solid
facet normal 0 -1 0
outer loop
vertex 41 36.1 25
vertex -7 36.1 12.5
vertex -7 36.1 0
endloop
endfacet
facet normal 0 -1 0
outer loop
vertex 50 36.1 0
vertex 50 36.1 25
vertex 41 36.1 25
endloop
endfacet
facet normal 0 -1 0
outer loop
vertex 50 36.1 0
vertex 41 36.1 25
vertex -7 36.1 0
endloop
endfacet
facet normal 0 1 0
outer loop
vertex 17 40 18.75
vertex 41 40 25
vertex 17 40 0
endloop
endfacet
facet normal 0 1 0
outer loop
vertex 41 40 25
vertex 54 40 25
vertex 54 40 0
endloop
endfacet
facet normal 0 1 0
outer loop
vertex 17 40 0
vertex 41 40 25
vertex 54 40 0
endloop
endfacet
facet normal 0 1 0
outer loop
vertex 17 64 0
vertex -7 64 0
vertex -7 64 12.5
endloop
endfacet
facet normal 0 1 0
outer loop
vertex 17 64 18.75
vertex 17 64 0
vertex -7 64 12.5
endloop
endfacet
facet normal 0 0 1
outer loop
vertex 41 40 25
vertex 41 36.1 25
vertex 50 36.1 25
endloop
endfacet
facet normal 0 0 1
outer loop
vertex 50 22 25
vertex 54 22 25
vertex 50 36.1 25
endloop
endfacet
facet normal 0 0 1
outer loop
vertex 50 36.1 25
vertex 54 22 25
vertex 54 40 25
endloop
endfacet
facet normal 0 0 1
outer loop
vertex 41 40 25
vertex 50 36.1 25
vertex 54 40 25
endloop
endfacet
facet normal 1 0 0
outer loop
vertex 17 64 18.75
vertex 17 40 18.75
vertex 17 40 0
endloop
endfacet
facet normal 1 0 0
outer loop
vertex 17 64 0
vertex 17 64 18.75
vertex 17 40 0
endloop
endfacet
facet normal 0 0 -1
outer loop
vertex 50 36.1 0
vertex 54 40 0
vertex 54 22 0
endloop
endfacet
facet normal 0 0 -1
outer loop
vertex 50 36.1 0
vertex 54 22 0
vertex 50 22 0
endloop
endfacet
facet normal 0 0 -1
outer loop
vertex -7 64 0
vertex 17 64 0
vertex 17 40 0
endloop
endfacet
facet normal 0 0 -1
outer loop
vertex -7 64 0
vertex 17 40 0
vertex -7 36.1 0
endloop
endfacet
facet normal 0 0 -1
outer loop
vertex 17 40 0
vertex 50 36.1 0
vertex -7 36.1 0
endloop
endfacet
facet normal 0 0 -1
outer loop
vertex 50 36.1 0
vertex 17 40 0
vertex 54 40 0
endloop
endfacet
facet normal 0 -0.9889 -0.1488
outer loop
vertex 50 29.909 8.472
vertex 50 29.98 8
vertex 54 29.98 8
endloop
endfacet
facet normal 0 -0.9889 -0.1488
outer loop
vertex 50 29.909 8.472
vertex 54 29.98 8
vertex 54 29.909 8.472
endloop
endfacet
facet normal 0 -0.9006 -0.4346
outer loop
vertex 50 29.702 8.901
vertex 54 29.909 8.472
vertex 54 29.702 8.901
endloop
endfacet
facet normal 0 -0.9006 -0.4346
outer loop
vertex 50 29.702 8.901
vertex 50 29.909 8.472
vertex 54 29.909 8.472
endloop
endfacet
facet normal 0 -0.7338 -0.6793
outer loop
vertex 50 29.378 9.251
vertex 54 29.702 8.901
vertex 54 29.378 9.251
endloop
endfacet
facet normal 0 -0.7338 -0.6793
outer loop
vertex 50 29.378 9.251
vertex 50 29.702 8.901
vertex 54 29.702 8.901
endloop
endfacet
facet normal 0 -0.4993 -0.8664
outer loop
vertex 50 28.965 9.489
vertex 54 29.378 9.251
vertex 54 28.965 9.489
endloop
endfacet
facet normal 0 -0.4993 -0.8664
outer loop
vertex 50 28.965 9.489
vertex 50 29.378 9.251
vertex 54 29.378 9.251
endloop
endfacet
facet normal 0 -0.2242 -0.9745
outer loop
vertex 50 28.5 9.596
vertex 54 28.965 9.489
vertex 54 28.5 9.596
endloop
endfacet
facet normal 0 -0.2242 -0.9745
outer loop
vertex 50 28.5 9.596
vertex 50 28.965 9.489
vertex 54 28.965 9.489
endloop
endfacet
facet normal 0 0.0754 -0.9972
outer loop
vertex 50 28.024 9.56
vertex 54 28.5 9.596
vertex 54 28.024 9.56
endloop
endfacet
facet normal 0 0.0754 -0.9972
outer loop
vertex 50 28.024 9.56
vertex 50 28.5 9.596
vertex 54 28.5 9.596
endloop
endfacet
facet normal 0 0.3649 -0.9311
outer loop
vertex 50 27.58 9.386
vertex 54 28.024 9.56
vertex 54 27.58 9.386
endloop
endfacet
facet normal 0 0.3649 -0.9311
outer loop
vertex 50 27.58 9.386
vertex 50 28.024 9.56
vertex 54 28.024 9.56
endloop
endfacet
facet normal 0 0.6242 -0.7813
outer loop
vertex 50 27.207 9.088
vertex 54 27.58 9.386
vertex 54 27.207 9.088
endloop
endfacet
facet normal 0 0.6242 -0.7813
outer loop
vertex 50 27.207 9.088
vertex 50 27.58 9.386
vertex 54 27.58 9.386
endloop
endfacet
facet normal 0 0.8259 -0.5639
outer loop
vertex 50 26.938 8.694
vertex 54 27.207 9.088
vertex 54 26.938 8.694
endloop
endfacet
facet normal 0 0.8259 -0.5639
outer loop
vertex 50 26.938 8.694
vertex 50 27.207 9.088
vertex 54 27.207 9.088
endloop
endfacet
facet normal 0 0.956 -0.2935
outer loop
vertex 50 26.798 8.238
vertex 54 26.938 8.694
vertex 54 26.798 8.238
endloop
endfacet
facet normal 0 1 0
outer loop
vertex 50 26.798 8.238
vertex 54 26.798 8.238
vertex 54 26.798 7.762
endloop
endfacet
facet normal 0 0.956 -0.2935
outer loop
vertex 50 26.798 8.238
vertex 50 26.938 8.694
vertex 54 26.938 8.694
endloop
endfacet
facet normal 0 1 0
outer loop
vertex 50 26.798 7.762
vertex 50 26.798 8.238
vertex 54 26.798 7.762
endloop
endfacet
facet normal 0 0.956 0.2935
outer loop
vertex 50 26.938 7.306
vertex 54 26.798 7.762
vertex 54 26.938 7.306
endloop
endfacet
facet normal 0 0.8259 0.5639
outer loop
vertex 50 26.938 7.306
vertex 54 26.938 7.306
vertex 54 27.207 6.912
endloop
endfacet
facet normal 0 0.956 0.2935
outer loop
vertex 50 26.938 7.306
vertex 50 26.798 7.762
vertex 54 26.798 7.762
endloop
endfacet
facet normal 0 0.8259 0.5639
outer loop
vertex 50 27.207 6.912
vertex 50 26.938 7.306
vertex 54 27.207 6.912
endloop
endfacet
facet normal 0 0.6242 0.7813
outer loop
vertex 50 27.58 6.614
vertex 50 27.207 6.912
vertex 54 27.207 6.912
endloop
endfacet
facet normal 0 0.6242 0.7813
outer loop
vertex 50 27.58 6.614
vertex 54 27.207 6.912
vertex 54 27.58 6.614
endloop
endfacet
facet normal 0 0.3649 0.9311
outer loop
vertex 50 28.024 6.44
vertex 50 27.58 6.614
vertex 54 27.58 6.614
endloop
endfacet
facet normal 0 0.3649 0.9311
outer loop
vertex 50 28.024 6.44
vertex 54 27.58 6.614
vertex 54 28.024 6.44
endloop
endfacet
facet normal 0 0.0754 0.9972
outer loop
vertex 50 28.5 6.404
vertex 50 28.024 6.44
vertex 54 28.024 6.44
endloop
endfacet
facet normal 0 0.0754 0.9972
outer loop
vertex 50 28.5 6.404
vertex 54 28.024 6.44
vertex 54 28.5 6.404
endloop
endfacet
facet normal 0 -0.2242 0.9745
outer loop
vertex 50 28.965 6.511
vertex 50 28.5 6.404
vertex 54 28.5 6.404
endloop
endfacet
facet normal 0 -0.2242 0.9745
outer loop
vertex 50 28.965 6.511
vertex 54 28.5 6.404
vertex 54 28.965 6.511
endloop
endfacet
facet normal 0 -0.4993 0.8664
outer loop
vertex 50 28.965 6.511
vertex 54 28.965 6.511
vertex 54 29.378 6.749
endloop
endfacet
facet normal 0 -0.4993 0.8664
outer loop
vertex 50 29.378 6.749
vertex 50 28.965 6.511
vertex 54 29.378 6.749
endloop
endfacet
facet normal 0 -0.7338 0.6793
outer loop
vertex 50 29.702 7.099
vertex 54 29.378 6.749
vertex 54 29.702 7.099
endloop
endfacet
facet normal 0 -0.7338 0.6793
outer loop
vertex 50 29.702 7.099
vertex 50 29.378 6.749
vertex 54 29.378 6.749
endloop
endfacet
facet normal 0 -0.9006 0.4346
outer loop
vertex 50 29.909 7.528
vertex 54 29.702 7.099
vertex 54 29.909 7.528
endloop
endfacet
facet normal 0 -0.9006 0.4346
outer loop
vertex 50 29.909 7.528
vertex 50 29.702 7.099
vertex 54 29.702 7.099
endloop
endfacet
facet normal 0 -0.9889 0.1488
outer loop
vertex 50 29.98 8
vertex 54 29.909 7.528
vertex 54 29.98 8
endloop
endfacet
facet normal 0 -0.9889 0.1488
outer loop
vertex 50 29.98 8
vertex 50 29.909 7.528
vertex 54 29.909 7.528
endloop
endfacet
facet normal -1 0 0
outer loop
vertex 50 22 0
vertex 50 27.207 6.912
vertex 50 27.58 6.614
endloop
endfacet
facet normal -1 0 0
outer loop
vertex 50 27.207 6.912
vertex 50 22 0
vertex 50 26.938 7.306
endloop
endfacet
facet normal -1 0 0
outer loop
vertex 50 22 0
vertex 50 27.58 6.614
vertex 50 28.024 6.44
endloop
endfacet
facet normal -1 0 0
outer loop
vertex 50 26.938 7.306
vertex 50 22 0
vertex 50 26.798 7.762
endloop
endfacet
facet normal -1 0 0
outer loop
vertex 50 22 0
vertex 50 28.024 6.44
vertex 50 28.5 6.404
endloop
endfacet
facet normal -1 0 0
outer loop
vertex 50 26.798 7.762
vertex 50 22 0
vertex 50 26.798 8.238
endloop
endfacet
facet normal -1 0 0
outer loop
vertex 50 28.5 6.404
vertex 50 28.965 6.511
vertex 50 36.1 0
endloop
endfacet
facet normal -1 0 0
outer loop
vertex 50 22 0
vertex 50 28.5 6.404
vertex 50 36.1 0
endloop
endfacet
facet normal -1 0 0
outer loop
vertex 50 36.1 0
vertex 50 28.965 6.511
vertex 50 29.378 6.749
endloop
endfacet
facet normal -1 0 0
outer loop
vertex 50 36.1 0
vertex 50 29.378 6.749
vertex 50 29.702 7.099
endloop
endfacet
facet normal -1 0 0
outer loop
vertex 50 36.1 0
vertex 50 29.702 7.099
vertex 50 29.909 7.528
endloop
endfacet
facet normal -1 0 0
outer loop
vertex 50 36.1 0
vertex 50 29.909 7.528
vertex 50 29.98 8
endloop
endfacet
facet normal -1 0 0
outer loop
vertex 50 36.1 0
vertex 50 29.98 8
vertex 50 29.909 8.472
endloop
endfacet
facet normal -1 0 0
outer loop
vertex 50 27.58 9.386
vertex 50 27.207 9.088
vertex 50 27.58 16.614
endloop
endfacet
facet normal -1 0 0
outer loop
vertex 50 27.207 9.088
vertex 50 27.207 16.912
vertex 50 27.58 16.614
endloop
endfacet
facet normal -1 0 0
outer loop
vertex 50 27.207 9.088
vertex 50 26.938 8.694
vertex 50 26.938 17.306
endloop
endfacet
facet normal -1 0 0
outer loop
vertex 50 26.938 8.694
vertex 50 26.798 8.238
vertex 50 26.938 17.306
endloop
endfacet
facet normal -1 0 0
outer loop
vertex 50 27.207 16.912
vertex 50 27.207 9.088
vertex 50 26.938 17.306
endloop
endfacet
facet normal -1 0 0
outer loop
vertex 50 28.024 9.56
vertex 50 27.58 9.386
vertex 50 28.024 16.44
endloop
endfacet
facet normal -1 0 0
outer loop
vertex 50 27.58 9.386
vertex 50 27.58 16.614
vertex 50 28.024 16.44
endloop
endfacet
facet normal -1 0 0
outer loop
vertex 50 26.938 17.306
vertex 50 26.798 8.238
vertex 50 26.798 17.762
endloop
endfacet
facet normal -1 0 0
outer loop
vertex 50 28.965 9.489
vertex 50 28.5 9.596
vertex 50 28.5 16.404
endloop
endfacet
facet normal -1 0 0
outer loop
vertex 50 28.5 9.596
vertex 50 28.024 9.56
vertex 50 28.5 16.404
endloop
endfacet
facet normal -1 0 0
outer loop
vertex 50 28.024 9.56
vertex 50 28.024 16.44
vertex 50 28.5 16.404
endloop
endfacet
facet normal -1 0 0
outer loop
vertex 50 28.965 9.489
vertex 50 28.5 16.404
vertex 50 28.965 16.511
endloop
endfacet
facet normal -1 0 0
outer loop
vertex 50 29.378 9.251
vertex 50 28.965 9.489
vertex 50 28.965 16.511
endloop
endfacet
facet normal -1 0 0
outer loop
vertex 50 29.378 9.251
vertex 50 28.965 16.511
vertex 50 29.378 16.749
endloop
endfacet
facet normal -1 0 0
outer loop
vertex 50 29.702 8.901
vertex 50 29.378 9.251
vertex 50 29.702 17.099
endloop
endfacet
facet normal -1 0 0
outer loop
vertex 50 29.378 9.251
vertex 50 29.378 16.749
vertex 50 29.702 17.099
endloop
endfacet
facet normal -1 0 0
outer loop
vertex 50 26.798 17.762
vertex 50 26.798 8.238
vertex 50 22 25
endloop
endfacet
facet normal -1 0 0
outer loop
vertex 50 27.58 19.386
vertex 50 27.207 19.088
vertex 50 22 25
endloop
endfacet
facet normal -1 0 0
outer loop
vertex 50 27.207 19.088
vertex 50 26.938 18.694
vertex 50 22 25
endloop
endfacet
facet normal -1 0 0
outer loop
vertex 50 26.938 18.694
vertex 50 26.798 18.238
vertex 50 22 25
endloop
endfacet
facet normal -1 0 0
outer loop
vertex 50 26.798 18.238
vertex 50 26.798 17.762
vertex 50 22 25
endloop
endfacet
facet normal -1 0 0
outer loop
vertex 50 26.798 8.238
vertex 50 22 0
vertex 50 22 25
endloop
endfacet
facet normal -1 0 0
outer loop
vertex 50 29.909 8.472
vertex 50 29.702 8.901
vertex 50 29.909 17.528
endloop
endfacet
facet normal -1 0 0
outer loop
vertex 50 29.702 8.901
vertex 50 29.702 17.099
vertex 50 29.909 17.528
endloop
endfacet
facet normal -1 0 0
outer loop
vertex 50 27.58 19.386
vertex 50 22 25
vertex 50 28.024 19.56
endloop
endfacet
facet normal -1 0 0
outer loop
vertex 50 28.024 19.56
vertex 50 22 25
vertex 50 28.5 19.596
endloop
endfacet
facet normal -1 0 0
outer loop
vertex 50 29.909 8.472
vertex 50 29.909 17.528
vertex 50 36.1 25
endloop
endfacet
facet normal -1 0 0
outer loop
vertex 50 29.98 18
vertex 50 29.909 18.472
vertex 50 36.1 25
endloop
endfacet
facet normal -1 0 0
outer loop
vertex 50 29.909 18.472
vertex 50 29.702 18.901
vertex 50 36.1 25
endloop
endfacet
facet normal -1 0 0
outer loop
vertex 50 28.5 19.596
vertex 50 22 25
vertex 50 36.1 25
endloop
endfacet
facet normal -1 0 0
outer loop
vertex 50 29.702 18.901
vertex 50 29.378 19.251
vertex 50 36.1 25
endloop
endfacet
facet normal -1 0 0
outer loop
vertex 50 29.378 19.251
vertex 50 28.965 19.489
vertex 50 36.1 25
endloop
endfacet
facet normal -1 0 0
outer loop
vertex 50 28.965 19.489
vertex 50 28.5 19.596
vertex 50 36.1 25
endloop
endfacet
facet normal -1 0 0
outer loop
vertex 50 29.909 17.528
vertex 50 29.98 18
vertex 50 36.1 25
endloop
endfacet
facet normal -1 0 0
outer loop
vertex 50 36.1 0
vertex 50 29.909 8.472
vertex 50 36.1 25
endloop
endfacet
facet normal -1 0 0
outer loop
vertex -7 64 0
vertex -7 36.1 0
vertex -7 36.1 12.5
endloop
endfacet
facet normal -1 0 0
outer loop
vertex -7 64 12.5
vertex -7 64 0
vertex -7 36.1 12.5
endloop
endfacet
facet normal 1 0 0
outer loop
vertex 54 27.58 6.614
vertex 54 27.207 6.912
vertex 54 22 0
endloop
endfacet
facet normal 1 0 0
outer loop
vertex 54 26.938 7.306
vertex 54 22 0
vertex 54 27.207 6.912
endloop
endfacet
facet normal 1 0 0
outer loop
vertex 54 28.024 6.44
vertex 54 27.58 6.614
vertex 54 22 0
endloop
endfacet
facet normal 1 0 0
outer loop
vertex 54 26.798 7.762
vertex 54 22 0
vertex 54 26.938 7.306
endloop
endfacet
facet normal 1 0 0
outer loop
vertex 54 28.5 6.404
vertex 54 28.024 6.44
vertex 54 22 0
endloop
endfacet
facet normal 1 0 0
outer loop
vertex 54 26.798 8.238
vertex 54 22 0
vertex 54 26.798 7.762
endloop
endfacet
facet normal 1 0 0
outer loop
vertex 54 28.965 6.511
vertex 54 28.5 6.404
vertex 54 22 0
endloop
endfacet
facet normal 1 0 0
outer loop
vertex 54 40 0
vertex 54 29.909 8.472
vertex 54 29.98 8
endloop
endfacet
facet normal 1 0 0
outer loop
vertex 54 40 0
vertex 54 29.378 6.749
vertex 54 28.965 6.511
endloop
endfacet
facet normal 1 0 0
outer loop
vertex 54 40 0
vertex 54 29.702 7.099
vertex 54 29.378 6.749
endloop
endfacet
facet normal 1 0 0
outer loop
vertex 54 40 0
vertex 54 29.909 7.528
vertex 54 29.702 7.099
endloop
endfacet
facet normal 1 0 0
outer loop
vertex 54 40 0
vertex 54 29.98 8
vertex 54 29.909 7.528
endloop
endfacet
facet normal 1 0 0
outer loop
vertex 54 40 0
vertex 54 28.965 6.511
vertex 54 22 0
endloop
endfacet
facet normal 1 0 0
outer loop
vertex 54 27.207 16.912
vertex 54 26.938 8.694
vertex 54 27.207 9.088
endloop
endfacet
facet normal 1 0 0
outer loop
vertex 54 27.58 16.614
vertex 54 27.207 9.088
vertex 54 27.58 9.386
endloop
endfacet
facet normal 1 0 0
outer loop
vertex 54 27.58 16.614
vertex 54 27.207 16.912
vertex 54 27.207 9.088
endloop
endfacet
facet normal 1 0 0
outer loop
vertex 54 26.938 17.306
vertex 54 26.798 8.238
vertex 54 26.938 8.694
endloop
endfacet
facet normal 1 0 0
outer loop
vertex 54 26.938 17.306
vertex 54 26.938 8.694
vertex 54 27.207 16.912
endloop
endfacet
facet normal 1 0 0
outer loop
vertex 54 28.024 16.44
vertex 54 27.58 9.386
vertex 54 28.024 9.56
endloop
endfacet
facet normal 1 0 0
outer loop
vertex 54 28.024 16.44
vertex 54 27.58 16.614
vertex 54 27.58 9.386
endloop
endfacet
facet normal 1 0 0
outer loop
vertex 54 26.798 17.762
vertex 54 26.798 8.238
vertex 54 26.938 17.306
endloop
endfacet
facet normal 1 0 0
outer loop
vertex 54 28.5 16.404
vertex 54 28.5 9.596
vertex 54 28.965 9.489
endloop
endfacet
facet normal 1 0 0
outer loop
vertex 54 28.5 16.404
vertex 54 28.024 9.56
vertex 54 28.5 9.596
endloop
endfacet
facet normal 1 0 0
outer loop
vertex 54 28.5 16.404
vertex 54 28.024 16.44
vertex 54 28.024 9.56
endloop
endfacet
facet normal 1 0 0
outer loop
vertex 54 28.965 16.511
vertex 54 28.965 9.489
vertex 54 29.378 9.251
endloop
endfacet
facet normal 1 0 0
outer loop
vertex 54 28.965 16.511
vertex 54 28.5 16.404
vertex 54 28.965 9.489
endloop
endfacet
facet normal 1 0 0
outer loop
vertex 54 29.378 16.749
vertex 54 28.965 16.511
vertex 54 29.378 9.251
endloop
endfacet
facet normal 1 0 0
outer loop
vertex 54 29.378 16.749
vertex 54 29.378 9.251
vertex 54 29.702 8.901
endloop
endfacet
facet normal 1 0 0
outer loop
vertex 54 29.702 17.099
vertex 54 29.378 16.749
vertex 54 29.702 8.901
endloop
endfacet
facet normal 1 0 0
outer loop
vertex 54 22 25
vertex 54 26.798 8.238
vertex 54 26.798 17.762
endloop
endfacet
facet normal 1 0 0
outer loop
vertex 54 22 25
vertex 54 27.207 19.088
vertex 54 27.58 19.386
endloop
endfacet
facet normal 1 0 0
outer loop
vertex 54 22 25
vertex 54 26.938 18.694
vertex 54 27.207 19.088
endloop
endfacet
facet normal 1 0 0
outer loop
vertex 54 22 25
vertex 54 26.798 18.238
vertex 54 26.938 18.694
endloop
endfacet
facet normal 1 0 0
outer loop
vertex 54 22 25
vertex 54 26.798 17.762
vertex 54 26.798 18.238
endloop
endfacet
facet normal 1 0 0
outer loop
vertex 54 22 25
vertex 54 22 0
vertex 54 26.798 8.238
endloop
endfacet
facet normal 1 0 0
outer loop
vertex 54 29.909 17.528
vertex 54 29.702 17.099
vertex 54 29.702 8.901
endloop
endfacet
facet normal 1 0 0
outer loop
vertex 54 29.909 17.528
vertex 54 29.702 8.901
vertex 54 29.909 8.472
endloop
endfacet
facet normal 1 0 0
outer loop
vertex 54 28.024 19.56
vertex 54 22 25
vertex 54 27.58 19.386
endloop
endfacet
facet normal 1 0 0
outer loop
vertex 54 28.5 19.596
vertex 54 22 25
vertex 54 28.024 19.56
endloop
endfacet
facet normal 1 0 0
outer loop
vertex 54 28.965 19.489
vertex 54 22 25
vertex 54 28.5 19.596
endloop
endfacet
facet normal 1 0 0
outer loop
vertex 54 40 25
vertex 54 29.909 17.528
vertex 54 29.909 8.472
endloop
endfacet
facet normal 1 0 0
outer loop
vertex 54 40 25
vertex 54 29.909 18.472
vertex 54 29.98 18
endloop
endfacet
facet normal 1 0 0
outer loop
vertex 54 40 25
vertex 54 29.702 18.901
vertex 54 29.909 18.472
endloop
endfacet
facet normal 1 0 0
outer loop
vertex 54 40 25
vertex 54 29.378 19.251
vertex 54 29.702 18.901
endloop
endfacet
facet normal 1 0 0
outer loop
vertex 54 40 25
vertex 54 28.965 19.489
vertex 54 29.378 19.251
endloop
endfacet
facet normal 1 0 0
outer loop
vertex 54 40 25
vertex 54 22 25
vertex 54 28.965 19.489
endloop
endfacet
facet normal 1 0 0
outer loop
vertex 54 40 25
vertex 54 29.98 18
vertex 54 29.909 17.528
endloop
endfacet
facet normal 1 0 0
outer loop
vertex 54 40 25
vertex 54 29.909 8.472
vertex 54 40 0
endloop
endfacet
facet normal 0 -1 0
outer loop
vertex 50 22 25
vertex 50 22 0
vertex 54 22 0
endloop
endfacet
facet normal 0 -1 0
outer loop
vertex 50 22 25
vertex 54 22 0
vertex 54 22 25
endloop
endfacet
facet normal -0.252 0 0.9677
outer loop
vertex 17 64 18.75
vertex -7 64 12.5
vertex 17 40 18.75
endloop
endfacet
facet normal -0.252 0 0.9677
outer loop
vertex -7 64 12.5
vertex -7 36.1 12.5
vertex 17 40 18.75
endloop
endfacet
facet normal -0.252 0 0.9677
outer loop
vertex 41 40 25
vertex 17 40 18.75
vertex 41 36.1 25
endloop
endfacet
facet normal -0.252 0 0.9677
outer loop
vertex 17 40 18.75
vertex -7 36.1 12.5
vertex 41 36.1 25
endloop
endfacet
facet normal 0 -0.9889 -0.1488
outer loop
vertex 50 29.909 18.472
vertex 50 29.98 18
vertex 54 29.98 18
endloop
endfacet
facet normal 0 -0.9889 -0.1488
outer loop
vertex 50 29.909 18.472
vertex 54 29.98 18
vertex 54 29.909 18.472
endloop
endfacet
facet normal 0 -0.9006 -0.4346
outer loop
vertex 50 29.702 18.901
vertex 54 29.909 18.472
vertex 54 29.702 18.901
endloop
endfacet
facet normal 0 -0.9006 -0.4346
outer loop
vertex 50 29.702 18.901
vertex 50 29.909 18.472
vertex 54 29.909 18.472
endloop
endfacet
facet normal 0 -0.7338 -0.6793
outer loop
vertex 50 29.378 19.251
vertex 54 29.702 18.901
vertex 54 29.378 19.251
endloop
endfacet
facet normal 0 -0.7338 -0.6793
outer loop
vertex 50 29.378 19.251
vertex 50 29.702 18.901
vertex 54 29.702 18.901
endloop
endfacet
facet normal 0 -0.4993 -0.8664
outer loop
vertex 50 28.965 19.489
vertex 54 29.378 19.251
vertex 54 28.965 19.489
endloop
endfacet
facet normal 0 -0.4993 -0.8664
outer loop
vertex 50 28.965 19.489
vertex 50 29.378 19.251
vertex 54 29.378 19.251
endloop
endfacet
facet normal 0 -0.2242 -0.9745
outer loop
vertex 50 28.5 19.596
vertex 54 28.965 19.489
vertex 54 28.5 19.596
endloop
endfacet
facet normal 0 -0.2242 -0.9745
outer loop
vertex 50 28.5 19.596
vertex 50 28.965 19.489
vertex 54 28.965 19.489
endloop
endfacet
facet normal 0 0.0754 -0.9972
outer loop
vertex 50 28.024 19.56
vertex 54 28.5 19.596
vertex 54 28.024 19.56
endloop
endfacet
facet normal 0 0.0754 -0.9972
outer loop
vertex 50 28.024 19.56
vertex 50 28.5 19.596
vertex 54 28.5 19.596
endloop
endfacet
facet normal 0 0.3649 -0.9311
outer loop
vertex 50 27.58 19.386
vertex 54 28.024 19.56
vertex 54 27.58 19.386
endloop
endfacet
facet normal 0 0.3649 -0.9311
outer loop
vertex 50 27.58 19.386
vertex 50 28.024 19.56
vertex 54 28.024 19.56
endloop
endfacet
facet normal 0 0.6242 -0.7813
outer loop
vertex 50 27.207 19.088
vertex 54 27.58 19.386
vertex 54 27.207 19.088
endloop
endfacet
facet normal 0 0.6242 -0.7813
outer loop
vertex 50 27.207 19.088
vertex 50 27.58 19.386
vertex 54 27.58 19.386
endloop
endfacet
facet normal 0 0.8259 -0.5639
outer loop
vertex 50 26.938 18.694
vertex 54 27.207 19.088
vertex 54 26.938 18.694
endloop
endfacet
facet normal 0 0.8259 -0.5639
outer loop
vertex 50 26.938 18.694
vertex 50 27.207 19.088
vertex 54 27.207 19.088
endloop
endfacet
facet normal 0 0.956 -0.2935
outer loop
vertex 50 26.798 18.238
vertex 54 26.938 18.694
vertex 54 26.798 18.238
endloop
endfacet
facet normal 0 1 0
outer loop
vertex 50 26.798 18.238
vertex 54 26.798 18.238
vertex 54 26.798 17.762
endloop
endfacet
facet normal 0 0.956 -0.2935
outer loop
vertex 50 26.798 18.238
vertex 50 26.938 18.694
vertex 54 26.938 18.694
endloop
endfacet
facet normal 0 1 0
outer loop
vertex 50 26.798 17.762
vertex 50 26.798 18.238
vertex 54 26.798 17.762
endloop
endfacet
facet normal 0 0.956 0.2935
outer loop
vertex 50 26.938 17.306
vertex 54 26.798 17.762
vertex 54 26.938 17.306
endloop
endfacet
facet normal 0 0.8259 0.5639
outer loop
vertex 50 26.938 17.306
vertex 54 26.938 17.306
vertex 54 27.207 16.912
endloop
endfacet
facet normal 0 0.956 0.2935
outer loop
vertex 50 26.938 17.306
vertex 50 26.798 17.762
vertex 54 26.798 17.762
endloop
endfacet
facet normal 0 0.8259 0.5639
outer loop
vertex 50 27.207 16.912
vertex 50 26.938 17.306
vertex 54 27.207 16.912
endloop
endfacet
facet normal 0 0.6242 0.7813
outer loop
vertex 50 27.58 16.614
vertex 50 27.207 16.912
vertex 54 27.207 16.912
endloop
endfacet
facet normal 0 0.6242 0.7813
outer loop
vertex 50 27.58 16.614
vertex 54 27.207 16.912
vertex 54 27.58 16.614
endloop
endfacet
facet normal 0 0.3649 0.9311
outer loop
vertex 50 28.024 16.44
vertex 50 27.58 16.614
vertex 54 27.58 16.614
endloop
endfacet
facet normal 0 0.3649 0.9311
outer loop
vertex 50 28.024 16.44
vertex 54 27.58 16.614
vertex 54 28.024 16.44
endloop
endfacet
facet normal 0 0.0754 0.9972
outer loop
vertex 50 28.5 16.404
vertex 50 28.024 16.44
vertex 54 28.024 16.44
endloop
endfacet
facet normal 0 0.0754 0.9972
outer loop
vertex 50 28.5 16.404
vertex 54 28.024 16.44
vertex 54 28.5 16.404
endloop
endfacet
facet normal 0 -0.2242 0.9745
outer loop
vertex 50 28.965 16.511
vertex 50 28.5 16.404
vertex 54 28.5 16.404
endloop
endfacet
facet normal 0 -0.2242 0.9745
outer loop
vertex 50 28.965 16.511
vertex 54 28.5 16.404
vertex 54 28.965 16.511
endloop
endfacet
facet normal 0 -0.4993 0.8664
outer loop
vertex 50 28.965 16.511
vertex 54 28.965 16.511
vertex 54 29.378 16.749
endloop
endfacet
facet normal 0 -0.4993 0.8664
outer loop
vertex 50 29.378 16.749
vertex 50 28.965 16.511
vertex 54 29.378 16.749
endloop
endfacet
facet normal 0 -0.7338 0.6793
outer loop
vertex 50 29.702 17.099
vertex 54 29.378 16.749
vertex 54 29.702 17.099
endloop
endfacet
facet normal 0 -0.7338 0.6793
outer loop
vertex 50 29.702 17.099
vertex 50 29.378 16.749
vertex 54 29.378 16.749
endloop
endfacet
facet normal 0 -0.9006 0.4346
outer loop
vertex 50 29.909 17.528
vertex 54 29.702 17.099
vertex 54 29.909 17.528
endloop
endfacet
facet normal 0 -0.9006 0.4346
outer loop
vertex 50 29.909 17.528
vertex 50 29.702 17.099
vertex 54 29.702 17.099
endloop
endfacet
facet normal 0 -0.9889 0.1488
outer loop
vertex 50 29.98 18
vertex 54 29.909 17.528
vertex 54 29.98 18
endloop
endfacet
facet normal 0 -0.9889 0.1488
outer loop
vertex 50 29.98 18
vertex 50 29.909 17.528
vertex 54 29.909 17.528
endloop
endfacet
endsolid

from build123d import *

# Parameters (mm, degrees)
SKETCH017_W     = 18
SKETCH017_H     = 25
SKETCH017_R     = 1.6
PAD012_DEPTH    = 4
SKETCH018_W     = 3.9
SKETCH018_H     = 25
PAD013_DEPTH    = 57
POCKET009_DEPTH = 5
PAD014_DEPTH    = 24


with BuildPart() as part:
    # Sketch017 → Pad012 (new body)
    with BuildSketch(Plane.YZ):
        with Locations((31, 12.5)):
            Rectangle(SKETCH017_W, SKETCH017_H)
        with Locations((28.38, 8)):
            Circle(SKETCH017_R, mode=Mode.SUBTRACT)
        with Locations((28.38, 18)):
            Circle(SKETCH017_R, mode=Mode.SUBTRACT)
    extrude(amount=PAD012_DEPTH)

    # Sketch018 (on Face7 of Pad012) → Pad013 (join)
    with BuildSketch(Plane(origin=(0, 0, 0), x_dir=(0, 1, 0), z_dir=(-1, 0, 0))):
        with Locations((38.05, -12.5)):
            Rectangle(SKETCH018_W, SKETCH018_H)
    extrude(amount=PAD013_DEPTH)

    # Sketch019 (on Face10 of Pad013) → Pocket009 (cut)
    with BuildSketch(Plane.ZX.offset(40)):
        Polygon((25, -9), (12.5, -57), (25, -57), align=None)
    extrude(amount=-POCKET009_DEPTH, mode=Mode.SUBTRACT)

    # Sketch020 (on Face6 of Pocket009) → Pad014 (join)
    with BuildSketch(Plane.ZX.offset(40)):
        Polygon((0, -57), (12.5, -57), (18.75, -33), (0, -33), align=None)
    extrude(amount=PAD014_DEPTH)


with BuildPart() as part_1:
    # Body002 placement: moved
    add(part.part.moved(Location((50, 0, 0))))


solid = part_1.part
